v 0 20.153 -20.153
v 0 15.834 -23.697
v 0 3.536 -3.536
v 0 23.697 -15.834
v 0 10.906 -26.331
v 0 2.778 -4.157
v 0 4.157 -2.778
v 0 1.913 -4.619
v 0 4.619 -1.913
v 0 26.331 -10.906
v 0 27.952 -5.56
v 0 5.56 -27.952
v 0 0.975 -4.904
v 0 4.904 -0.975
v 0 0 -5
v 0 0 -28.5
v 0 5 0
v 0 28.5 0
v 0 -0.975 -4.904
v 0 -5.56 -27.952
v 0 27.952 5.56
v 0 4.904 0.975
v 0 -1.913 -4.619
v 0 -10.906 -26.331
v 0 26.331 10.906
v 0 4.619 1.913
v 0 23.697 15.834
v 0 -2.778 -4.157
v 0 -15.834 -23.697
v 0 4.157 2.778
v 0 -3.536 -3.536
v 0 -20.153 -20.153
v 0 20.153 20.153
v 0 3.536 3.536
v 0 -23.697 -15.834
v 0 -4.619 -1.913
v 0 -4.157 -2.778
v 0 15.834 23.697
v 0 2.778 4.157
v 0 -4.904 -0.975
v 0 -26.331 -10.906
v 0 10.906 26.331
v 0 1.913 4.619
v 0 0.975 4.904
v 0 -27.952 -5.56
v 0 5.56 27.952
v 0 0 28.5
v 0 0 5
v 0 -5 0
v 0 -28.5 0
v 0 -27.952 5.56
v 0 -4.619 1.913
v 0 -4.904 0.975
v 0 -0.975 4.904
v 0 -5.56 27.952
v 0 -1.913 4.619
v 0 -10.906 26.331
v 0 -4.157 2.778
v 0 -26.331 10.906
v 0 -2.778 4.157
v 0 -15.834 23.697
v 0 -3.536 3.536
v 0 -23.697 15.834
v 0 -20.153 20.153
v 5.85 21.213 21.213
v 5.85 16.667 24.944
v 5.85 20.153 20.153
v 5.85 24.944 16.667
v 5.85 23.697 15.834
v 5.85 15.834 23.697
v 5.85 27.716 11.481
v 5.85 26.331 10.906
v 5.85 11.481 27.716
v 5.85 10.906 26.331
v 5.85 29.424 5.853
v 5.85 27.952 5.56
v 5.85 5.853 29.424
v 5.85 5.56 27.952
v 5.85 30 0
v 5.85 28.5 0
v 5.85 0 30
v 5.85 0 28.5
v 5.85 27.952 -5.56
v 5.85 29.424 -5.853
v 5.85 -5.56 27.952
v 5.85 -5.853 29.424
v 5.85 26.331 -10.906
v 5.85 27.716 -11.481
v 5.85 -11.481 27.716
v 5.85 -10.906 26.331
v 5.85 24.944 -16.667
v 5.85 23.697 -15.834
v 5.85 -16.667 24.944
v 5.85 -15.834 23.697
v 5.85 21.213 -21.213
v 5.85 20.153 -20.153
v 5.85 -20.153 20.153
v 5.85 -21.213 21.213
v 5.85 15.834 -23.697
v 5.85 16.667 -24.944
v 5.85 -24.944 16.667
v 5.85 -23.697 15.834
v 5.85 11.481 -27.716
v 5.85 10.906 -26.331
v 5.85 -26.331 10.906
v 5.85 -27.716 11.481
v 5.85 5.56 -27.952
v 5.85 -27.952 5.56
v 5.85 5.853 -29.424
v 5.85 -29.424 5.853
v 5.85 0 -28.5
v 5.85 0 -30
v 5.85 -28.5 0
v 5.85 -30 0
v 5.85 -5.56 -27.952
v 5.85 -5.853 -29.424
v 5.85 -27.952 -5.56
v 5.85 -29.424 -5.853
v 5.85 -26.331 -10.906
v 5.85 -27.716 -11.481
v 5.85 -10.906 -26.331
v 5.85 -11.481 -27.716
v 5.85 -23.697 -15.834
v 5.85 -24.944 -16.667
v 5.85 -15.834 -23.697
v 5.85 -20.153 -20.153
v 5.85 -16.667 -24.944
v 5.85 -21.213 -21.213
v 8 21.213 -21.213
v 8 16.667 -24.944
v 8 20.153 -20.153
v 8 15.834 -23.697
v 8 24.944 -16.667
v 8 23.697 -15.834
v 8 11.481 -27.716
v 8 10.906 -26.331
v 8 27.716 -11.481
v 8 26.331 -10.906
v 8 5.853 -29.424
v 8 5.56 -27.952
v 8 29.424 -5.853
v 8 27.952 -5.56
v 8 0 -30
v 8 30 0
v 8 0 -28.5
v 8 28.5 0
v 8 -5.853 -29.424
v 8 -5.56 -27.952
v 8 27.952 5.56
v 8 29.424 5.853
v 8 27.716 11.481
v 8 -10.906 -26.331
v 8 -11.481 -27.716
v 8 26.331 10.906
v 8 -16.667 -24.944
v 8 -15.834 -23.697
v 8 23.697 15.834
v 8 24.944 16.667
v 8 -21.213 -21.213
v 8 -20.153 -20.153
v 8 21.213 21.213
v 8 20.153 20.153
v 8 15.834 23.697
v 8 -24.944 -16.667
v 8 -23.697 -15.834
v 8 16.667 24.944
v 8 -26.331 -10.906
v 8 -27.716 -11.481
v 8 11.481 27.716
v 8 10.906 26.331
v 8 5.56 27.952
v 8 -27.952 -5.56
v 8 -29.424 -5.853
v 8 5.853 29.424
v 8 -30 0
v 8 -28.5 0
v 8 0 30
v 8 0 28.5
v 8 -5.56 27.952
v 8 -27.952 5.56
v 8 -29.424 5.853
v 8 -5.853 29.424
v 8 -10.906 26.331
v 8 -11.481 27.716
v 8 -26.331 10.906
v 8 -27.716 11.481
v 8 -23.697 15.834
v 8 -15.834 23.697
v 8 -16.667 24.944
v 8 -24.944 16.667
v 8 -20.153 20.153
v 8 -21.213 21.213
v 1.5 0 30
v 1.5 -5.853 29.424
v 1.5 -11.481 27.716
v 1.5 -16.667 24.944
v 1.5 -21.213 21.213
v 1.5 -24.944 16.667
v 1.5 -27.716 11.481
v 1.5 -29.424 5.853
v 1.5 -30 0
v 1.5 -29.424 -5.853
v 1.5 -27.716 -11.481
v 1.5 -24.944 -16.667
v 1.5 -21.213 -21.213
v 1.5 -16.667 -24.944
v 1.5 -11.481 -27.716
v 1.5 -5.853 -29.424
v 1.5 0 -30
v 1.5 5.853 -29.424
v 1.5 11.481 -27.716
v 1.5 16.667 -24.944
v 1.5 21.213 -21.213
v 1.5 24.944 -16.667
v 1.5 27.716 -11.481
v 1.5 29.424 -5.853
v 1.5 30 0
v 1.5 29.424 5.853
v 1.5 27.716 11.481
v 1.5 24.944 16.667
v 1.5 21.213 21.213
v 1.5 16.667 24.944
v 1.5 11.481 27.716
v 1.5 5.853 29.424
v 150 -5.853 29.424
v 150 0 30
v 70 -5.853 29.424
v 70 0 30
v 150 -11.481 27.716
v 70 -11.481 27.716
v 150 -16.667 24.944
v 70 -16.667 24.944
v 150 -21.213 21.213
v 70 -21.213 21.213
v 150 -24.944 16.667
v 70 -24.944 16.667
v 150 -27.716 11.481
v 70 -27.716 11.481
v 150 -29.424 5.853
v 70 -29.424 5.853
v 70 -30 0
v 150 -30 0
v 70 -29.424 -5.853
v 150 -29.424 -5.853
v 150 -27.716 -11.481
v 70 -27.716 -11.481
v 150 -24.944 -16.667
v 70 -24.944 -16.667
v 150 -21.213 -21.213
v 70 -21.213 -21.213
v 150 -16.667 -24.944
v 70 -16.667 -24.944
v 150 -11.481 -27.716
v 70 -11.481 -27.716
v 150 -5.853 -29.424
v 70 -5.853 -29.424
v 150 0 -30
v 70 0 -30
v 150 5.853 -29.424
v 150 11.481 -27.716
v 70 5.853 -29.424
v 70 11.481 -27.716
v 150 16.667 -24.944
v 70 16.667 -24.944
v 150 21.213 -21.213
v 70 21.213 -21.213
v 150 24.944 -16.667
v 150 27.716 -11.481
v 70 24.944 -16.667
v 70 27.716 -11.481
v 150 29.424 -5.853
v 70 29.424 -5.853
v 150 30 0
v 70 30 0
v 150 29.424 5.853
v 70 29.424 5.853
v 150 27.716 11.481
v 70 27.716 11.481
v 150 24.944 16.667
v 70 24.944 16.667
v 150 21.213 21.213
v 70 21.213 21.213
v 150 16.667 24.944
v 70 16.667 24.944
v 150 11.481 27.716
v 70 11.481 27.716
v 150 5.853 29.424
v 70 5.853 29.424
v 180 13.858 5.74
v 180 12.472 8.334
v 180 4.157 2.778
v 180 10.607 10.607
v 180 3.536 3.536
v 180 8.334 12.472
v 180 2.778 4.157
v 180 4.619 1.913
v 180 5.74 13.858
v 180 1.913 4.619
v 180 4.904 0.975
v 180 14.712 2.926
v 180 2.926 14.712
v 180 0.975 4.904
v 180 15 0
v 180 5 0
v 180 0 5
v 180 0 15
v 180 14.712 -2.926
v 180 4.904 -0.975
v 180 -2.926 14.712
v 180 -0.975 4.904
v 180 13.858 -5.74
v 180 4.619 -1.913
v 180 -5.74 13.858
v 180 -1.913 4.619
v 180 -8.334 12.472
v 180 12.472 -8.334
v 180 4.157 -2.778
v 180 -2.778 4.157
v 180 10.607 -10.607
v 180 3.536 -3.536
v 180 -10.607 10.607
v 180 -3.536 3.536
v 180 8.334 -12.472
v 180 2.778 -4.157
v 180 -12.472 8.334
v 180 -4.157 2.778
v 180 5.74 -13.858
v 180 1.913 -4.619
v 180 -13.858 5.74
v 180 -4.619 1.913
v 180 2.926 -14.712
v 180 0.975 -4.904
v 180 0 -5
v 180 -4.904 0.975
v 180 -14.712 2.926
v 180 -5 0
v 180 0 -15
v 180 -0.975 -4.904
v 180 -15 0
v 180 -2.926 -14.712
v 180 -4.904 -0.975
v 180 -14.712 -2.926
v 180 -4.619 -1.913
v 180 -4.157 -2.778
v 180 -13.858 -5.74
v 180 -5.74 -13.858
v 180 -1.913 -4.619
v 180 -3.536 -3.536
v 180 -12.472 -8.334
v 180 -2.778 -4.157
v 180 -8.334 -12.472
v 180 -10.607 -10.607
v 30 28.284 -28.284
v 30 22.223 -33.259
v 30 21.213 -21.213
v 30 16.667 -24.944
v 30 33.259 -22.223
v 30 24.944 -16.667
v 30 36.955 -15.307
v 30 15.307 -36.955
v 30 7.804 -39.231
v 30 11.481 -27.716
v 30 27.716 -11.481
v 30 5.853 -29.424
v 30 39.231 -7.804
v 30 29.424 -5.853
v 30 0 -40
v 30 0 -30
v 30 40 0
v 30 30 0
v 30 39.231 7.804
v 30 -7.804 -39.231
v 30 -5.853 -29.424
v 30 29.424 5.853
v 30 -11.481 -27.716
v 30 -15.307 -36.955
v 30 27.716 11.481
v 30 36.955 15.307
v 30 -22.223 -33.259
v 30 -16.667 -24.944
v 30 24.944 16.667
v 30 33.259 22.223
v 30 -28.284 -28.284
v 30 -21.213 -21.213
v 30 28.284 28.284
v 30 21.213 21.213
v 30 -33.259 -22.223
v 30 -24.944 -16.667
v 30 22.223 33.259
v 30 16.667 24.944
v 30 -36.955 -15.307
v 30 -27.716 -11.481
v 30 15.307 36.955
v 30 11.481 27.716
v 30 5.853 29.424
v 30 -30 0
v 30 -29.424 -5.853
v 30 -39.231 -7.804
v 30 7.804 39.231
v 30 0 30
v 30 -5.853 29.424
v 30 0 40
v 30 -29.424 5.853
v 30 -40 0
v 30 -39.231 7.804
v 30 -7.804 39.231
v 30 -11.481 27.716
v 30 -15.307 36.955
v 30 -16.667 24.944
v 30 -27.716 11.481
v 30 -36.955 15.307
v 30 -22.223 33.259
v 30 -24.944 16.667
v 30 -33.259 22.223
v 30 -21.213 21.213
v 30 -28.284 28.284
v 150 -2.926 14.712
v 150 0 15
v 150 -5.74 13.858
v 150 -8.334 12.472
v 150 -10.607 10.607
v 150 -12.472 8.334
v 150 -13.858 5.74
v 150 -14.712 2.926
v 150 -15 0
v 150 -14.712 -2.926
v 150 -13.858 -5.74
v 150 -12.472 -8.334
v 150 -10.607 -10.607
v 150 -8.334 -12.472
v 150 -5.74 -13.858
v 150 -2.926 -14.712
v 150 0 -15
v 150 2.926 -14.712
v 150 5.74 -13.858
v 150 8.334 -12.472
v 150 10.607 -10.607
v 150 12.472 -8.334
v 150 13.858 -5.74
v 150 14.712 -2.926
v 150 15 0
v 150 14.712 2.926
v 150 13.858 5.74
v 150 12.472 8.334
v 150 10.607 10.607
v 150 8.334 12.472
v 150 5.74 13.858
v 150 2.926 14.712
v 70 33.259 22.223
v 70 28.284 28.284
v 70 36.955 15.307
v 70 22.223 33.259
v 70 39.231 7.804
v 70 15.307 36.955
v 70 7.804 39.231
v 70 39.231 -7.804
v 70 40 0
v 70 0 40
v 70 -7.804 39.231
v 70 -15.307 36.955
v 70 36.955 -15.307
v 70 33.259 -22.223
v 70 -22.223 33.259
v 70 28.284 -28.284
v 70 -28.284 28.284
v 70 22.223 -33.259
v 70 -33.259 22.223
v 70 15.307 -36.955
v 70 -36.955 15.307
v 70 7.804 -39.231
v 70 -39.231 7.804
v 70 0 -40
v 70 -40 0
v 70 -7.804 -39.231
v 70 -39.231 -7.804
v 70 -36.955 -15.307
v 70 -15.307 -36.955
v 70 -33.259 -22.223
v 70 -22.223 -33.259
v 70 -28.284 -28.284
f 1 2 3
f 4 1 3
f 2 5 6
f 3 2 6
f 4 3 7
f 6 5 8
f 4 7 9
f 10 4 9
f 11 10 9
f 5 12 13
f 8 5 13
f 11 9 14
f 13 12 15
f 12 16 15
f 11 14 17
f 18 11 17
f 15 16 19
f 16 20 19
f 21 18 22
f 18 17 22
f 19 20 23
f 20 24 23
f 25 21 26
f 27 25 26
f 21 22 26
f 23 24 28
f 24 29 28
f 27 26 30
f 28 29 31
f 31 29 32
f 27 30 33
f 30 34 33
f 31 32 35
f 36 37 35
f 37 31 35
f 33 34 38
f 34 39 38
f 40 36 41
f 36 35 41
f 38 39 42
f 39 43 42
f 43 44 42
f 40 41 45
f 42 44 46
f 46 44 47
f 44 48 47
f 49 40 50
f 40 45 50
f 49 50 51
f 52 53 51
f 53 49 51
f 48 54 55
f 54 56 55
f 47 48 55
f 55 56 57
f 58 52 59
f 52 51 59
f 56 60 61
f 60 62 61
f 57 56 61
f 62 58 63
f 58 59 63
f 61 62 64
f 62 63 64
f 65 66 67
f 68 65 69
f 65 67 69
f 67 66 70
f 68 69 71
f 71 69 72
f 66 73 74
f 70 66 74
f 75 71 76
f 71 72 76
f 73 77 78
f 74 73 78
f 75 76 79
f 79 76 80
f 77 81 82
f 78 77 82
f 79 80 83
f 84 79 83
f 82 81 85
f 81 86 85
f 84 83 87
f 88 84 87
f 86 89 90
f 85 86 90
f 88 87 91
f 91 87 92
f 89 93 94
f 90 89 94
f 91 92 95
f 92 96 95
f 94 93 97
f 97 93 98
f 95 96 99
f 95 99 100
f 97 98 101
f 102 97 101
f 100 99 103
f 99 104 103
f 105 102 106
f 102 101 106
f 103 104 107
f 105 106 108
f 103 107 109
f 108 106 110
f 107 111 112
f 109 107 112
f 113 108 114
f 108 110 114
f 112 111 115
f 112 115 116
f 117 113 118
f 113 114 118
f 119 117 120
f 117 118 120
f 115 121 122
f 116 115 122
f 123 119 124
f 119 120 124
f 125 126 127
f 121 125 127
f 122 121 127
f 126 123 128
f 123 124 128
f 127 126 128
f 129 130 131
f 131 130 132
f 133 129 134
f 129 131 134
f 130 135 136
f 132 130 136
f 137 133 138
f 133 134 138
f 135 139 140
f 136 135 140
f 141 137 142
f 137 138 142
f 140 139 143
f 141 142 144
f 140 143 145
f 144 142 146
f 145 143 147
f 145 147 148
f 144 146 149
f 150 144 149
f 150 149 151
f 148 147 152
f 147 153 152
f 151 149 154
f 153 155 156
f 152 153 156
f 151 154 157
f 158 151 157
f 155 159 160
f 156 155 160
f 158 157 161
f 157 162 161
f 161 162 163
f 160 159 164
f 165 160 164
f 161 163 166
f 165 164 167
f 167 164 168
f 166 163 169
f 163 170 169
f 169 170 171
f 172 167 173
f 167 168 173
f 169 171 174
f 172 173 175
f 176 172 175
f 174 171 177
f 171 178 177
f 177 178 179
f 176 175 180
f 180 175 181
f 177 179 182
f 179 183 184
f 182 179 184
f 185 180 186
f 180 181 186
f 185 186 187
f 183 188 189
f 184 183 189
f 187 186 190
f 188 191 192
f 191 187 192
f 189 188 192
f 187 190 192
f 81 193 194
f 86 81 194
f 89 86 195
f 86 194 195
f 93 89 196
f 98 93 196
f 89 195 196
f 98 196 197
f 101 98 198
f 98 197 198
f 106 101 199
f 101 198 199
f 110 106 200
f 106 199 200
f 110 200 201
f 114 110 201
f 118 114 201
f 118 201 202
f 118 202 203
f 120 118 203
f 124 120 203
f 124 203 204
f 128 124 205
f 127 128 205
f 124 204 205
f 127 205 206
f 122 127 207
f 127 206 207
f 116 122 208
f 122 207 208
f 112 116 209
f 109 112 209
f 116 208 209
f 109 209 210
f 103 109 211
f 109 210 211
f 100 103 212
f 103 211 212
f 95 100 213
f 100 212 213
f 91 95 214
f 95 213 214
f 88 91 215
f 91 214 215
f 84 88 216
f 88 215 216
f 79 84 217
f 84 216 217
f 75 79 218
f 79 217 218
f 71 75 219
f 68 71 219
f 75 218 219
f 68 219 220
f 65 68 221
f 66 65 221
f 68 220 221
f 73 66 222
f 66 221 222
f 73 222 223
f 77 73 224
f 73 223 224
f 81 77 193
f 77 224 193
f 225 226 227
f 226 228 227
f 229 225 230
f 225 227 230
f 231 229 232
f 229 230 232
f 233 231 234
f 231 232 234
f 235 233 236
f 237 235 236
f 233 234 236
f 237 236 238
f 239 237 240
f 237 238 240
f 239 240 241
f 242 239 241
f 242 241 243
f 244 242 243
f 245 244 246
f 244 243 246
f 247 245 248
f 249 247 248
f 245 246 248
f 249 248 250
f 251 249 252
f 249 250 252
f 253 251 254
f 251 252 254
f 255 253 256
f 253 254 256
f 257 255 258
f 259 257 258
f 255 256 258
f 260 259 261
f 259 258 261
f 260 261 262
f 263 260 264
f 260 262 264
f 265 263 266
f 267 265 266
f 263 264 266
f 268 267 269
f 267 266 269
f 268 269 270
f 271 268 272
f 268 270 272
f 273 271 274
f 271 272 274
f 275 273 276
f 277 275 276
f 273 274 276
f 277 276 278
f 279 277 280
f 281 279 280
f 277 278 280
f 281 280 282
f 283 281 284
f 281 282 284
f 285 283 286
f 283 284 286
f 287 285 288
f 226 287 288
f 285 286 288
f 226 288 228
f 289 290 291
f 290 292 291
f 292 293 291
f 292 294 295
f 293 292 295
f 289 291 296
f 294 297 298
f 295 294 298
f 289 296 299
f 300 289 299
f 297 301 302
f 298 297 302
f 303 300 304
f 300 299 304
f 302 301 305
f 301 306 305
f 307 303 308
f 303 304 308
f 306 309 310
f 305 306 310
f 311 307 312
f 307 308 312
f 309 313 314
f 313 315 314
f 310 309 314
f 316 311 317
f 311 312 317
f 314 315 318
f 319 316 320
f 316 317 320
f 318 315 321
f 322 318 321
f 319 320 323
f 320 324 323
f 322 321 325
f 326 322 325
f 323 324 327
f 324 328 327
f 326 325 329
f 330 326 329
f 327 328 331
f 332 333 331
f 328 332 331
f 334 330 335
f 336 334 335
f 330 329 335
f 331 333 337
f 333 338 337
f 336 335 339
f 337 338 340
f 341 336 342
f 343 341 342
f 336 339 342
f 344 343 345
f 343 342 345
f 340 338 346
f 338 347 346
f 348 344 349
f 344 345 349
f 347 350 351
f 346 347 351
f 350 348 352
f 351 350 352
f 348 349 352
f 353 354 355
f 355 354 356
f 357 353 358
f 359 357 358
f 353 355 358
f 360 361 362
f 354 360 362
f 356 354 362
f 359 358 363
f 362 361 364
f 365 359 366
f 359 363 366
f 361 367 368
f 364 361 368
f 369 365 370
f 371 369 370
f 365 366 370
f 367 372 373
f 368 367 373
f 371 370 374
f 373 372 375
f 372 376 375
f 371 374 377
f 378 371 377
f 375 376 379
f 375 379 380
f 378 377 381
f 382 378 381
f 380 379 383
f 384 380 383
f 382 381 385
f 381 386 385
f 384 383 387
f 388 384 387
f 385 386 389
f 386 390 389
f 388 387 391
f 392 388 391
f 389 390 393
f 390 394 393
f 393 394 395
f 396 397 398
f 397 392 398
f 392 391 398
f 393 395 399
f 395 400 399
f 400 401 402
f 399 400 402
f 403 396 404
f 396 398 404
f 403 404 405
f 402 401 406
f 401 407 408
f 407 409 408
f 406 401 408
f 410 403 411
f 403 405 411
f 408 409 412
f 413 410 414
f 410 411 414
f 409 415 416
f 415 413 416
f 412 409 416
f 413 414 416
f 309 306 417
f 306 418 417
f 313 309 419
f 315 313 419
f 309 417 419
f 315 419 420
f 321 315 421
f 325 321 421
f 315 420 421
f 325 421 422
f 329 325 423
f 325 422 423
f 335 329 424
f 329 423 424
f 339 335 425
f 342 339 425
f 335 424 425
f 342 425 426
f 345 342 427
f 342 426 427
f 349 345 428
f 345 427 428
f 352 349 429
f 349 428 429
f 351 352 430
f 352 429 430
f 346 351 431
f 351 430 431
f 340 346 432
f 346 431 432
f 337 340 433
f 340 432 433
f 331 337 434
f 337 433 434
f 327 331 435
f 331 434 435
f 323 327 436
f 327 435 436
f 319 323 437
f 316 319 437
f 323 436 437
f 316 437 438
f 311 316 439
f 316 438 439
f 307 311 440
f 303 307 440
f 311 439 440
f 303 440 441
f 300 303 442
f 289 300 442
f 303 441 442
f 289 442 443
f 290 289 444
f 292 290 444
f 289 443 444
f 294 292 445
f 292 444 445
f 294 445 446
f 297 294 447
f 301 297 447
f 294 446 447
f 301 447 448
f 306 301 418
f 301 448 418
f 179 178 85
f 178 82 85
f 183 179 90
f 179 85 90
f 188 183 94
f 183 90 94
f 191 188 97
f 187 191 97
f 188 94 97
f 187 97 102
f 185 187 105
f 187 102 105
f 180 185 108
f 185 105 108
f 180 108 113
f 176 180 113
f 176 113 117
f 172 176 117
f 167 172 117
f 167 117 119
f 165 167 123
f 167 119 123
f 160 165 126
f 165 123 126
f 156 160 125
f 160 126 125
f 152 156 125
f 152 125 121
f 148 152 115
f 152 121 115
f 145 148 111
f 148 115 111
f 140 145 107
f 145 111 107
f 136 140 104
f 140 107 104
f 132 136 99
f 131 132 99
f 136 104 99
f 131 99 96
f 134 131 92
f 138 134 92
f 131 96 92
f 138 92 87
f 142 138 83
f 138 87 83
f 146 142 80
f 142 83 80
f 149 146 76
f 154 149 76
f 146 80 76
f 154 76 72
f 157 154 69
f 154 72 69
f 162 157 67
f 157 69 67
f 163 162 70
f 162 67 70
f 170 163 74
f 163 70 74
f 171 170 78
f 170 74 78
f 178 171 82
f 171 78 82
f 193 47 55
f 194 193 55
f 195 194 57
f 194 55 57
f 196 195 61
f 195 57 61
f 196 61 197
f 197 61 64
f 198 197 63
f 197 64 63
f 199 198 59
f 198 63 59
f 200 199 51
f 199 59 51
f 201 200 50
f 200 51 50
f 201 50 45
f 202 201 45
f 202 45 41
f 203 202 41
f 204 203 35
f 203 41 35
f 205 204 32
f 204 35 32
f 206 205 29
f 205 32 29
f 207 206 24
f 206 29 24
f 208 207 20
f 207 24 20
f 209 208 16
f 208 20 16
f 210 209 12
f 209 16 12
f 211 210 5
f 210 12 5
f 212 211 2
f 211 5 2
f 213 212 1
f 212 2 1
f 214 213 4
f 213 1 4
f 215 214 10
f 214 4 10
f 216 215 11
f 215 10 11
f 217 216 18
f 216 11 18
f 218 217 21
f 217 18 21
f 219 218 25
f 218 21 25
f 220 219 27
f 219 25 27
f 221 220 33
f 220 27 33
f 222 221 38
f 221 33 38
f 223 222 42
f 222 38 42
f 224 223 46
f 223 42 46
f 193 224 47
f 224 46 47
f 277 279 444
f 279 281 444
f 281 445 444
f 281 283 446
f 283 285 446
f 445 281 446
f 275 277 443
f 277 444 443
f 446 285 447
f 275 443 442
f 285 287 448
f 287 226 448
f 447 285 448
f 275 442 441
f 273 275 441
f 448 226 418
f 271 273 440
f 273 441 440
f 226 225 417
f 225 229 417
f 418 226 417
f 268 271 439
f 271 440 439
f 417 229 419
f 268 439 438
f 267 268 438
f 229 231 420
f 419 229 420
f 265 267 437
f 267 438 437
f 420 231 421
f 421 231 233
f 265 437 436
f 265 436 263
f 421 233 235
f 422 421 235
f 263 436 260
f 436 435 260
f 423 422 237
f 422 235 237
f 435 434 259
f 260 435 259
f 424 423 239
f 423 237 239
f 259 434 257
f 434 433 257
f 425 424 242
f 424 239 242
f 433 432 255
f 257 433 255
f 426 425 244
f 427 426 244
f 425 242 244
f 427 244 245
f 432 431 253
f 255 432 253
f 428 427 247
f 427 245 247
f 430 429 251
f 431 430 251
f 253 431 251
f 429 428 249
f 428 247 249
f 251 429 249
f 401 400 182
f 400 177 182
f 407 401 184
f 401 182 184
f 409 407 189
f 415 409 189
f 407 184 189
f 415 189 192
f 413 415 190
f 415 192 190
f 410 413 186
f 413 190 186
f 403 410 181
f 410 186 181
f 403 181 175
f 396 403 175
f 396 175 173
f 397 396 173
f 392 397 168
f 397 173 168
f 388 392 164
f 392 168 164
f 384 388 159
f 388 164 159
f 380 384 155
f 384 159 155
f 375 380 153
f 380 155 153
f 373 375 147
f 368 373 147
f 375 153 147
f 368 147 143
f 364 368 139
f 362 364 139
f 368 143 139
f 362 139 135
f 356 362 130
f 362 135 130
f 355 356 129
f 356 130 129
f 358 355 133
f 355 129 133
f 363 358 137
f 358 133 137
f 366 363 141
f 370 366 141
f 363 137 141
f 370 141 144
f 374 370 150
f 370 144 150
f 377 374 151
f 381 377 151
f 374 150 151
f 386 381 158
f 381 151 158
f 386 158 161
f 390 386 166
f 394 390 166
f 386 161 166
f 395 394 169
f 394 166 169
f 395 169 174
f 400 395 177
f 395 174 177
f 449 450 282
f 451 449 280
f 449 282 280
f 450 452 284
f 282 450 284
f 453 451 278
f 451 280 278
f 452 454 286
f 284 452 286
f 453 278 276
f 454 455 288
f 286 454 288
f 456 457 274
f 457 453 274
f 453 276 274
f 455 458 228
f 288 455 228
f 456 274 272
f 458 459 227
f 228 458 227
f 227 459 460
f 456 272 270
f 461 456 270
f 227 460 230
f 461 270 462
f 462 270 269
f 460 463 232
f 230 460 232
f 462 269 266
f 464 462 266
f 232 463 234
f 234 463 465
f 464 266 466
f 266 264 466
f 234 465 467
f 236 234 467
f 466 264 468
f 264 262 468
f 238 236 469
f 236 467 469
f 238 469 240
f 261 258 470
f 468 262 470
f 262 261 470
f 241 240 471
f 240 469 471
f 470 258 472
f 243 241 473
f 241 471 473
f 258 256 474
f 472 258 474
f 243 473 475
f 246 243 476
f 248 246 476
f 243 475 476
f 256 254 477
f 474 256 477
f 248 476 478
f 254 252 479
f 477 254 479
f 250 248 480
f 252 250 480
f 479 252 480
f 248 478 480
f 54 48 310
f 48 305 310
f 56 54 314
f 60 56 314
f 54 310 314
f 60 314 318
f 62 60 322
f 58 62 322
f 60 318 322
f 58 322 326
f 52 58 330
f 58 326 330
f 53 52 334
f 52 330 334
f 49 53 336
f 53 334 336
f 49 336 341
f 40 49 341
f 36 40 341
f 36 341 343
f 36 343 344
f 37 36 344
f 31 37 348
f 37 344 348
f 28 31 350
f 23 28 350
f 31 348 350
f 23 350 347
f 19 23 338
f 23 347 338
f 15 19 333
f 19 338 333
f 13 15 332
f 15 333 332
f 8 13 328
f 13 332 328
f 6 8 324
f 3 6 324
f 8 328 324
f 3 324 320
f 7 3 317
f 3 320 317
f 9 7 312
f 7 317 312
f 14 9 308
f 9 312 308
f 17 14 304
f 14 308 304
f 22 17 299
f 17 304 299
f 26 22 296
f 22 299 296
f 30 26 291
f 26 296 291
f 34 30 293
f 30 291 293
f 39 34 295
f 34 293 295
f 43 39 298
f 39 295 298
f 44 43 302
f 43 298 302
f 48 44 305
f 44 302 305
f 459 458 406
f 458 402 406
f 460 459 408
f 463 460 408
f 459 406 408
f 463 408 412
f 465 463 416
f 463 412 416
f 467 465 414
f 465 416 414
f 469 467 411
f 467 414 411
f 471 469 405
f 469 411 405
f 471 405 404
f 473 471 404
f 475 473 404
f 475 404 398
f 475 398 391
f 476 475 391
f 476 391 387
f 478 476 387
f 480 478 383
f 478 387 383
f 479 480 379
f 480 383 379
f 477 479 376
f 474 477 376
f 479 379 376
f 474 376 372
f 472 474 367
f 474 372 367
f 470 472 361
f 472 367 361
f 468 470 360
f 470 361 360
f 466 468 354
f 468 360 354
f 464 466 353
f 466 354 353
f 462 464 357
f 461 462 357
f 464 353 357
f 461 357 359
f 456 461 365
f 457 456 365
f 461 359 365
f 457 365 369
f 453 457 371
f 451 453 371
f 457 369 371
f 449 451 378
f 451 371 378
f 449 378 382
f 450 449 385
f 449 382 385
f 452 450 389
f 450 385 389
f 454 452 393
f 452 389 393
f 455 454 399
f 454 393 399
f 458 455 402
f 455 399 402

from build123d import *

# Parameters (mm, degrees)
F2_SIZE = 1.5


with BuildPart() as f1:
    # F0 (on Front) → F1 (revolve)
    with BuildSketch(Plane.XZ):
        Polygon((5.85, 30), (0, 30), (0, 5), (180, 5), (180, 15), (150, 15), (150, 30), (70, 30), (70, 40), (30, 40), (30, 30), (8, 30), (8, 28.5), (5.85, 28.5), align=None)
    revolve(axis=Axis((74.107222, 0, 0), (1, 0, 0)))

    # F2
    f2_edges = [f1.edges().sort_by_distance(p)[0] for p in [
        (0, 0, -30),
    ]]
    chamfer(f2_edges, length=F2_SIZE)


solid = f1.part
